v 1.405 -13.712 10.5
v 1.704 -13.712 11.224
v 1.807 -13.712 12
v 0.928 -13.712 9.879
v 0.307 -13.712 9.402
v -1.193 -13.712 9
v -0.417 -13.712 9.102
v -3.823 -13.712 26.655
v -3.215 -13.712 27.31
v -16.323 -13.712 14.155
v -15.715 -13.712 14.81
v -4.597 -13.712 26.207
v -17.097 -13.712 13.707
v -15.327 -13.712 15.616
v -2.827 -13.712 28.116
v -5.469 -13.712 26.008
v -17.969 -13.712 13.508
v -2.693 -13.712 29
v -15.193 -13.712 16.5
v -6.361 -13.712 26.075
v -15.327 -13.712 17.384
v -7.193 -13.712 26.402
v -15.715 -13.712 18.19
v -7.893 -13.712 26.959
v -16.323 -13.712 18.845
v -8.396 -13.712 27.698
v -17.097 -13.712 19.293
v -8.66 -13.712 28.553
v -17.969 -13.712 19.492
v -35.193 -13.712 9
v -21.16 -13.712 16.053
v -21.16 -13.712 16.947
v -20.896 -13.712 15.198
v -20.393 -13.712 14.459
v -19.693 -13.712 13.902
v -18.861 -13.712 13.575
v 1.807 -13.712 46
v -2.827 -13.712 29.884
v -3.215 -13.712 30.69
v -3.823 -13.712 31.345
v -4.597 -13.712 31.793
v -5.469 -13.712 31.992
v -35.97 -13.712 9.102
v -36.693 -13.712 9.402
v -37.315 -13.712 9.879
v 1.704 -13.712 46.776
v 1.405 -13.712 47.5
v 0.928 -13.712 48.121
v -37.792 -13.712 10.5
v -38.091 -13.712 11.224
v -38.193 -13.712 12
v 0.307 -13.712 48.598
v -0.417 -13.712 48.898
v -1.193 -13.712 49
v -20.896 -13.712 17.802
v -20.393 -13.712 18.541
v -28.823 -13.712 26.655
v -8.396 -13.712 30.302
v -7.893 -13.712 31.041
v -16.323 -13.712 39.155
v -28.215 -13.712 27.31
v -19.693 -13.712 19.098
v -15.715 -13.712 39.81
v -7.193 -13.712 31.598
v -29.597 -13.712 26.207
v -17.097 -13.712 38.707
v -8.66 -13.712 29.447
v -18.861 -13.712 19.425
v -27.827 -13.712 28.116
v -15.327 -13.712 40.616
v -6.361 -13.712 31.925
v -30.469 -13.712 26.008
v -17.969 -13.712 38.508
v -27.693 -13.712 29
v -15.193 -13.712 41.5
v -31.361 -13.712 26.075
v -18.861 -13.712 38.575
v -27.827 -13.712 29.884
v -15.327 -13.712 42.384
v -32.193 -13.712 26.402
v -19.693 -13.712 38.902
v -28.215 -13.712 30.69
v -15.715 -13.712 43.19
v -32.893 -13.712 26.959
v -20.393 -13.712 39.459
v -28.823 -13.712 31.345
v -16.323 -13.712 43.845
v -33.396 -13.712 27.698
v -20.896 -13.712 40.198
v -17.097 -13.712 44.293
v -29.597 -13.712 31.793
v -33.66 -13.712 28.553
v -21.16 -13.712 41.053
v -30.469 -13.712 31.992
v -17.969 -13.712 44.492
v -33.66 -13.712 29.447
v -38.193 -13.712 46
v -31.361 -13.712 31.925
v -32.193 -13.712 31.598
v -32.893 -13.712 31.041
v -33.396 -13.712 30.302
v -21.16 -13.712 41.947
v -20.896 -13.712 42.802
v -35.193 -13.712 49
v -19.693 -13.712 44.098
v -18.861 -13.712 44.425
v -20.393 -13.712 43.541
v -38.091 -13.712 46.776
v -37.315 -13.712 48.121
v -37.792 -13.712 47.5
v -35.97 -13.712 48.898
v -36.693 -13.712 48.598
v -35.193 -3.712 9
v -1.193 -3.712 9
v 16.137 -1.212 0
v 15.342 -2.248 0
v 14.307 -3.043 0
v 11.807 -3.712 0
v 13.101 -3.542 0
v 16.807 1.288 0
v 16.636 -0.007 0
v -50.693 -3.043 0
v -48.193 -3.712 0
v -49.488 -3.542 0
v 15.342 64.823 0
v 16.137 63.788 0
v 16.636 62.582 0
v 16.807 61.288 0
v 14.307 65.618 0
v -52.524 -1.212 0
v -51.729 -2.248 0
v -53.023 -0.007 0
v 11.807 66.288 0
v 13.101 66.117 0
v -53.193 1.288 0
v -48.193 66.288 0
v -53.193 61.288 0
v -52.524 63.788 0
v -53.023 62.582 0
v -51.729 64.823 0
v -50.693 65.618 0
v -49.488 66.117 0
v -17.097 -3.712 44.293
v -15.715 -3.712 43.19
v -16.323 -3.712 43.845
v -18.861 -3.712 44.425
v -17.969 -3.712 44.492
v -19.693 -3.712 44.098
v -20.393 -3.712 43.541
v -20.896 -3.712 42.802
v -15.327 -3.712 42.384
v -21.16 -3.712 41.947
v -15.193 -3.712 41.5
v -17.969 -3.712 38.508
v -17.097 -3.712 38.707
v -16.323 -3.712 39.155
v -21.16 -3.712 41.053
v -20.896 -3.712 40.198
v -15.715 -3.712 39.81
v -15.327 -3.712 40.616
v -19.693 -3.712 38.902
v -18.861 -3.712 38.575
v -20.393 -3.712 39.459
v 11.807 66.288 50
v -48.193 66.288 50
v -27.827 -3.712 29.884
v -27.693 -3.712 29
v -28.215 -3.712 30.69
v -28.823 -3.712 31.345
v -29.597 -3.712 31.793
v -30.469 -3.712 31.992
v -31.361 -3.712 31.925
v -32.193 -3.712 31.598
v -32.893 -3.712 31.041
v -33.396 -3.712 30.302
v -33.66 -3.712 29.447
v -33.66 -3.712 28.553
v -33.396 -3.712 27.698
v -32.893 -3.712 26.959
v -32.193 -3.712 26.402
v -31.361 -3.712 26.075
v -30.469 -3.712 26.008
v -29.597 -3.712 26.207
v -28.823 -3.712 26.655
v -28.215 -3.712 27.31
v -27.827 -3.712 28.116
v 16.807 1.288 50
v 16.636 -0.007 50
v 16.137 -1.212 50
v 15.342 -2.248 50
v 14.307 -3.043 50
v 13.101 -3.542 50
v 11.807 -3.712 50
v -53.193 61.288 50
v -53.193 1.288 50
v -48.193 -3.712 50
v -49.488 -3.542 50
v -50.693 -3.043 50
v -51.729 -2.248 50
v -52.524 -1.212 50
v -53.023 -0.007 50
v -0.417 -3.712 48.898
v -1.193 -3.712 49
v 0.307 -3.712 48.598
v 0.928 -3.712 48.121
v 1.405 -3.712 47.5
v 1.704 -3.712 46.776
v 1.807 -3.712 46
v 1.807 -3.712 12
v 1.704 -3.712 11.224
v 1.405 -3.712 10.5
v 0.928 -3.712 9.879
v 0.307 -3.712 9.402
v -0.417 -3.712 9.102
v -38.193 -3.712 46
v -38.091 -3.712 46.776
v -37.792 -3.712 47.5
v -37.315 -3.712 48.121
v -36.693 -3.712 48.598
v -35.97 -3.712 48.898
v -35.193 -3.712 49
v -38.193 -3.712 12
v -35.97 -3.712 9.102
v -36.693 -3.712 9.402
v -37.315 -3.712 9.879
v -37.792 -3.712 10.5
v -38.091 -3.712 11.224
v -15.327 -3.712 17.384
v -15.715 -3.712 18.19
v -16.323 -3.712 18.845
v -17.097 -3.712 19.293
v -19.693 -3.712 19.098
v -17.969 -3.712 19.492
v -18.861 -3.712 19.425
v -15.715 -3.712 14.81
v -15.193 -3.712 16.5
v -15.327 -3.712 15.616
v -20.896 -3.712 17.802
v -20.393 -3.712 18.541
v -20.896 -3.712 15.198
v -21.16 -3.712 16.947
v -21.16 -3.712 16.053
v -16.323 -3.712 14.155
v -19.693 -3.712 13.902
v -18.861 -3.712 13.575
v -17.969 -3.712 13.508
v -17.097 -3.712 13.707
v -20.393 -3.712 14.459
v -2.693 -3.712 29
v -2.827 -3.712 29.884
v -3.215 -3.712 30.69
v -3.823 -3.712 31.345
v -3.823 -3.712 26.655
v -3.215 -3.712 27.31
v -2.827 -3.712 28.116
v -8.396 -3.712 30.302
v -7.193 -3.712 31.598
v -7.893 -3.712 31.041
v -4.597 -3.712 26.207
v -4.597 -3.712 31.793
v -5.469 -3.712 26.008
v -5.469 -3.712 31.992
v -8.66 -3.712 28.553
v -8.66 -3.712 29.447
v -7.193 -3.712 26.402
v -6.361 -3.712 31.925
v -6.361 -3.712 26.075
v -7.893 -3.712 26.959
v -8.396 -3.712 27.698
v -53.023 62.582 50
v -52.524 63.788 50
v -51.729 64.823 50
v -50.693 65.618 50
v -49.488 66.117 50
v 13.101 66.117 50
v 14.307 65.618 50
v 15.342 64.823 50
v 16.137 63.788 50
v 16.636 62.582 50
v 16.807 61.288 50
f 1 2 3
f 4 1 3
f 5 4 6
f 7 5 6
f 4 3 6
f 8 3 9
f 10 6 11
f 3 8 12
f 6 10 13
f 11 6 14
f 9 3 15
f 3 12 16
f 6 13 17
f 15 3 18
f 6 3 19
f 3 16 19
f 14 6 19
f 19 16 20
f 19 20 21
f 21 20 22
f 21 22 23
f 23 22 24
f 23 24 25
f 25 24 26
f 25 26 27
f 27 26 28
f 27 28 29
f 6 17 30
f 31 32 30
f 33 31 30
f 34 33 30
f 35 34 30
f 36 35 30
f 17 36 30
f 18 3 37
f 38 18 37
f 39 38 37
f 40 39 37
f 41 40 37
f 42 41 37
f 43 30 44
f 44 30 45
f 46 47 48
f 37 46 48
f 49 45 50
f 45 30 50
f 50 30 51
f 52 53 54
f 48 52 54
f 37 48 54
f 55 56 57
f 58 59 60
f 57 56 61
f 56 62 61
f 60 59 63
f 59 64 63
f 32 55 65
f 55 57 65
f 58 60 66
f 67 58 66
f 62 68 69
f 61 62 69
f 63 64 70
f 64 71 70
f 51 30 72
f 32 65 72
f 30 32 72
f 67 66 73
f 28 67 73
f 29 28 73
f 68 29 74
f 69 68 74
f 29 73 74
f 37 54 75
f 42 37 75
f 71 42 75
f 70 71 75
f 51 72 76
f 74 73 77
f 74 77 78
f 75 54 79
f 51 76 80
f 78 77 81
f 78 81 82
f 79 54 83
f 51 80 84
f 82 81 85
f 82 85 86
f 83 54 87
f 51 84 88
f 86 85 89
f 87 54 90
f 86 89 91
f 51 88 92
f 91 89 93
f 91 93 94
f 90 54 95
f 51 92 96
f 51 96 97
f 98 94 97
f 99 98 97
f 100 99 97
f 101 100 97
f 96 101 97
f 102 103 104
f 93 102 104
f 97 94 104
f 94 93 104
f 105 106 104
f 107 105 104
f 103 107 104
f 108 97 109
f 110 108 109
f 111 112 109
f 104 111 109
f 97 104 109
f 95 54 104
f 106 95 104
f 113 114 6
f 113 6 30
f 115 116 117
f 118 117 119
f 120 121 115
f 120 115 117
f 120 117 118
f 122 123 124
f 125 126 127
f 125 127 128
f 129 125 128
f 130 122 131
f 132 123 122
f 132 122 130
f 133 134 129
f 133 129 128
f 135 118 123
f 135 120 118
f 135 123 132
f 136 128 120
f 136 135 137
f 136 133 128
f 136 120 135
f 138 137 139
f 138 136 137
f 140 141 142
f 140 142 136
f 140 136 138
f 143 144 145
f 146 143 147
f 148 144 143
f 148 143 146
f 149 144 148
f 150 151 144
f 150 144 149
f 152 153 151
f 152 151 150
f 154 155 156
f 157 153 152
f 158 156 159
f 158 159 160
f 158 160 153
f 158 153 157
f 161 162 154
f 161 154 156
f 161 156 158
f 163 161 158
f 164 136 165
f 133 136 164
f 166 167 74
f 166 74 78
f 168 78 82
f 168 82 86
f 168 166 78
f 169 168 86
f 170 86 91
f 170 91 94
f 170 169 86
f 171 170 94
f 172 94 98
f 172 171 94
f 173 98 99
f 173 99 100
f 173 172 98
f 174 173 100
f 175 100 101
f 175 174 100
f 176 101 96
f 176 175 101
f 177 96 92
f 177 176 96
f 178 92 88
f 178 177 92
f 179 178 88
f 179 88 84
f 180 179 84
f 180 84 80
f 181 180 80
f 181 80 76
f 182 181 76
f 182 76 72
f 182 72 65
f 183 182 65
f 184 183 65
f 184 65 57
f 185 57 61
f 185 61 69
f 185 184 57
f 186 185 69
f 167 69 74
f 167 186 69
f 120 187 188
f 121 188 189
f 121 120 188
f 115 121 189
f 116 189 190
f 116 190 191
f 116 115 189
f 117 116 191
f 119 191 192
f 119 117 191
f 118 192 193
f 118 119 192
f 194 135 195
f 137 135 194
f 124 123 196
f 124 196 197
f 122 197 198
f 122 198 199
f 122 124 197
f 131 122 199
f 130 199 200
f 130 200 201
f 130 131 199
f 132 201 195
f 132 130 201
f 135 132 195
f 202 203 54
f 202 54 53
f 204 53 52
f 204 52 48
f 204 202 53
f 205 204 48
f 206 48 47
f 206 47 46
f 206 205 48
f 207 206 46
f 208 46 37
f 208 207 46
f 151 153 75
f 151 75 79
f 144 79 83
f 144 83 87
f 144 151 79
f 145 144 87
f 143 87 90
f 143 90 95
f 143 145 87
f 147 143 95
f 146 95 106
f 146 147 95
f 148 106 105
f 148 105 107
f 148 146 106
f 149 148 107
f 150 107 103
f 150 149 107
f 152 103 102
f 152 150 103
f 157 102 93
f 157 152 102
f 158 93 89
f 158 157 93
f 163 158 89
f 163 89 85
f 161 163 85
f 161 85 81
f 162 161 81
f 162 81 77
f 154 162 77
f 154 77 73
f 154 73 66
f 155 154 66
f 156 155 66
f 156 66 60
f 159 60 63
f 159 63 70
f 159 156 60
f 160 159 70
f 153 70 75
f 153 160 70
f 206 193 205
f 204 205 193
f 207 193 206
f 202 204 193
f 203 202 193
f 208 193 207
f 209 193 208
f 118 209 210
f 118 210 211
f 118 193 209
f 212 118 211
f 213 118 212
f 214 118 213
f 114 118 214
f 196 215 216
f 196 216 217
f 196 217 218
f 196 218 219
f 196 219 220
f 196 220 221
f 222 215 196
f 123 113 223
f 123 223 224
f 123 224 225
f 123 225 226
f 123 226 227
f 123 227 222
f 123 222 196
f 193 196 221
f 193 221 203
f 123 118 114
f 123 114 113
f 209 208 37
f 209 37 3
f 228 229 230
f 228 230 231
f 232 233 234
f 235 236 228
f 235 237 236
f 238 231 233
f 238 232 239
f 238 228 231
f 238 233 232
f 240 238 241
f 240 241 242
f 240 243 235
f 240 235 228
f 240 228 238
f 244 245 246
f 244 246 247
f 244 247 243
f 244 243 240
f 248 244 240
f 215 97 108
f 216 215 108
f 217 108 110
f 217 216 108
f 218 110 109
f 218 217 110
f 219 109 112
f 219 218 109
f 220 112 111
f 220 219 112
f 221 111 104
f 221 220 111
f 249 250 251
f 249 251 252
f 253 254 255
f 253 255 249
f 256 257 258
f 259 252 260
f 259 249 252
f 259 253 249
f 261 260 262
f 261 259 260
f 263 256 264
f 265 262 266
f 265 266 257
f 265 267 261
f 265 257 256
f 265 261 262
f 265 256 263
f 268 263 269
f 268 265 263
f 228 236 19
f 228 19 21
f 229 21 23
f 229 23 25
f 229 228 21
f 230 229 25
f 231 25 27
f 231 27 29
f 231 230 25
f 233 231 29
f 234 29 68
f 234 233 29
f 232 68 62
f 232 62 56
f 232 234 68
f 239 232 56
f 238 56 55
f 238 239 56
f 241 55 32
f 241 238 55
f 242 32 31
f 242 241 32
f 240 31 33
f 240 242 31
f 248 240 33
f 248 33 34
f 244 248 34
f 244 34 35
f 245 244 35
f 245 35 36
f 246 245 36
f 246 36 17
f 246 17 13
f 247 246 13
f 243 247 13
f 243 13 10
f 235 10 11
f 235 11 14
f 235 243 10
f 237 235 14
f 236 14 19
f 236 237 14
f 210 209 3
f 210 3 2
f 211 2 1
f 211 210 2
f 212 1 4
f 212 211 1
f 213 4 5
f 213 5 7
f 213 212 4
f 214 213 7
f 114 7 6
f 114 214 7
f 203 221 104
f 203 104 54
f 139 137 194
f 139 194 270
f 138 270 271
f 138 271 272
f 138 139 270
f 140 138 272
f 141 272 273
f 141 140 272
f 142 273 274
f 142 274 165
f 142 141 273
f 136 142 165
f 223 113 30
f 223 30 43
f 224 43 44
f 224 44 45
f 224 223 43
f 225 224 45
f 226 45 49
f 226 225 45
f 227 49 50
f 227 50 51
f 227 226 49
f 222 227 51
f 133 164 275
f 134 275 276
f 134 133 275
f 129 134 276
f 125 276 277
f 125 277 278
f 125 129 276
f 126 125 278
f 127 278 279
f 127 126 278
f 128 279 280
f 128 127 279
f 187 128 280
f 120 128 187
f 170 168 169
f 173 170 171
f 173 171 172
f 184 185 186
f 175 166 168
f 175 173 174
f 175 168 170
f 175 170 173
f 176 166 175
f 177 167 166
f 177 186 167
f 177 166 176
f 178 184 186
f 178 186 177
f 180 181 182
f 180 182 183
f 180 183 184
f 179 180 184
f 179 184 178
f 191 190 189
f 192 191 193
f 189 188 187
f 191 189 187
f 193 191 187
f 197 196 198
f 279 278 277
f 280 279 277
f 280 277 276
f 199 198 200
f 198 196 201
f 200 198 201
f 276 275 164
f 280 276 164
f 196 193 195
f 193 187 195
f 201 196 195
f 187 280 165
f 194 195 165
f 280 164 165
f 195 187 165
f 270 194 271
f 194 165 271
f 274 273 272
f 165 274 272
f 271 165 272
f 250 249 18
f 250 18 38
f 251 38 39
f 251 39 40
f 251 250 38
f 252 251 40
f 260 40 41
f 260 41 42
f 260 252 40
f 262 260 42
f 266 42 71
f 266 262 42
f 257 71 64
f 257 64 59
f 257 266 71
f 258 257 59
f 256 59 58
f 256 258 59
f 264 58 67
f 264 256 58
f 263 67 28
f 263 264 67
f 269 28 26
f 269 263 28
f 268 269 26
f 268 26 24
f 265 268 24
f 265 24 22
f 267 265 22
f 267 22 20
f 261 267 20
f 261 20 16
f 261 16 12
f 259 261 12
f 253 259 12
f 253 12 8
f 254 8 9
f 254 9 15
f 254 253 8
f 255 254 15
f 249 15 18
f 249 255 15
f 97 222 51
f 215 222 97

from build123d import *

# Parameters (mm, degrees)
EXTRUDE_1_DEPTH = 50
SKETCH_2_R      = 3
EXTRUDE_2_DEPTH = 10


with BuildPart() as part:
    # 草图1 → 凸台-拉伸1 (new body)
    with BuildSketch(Plane.XY):
        with BuildLine():
            Line((-48.193457488, 66.287565891), (11.806542512, 66.287565891))
            ThreePointArc((11.806542512, 66.287565891), (15.342076418, 64.823099797), (16.806542512, 61.287565891))
            Line((16.806542512, 61.287565891), (16.806542512, 1.287565891))
            ThreePointArc((16.806542512, 1.287565891), (15.342076418, -2.247968015), (11.806542512, -3.712434109))
            Line((11.806542512, -3.712434109), (-48.193457488, -3.712434109))
            ThreePointArc((-48.193457488, -3.712434109), (-51.728991394, -2.247968015), (-53.193457488, 1.287565891))
            Line((-53.193457488, 1.287565891), (-53.193457488, 61.287565891))
            ThreePointArc((-53.193457488, 61.287565891), (-51.728991394, 64.823099797), (-48.193457488, 66.287565891))
        make_face()
    extrude(amount=EXTRUDE_1_DEPTH)

    # 草图2 → 凸台-拉伸2 (add)
    with BuildSketch(Plane.XZ.offset(3.712434109)):
        with BuildLine():
            Line((-18.193457488, 9), (-35.193457488, 9))
            ThreePointArc((-35.193457488, 9), (-37.314777832, 9.878679656), (-38.193457488, 12))
            Line((-38.193457488, 12), (-38.193457488, 46))
            ThreePointArc((-38.193457488, 46), (-37.314777832, 48.121320344), (-35.193457488, 49))
            Line((-35.193457488, 49), (-1.193457488, 49))
            ThreePointArc((-1.193457488, 49), (0.927862855, 48.121320344), (1.806542512, 46))
            Line((1.806542512, 46), (1.806542512, 12))
            ThreePointArc((1.806542512, 12), (0.927862855, 9.878679656), (-1.193457488, 9))
            Line((-1.193457488, 9), (-18.193457488, 9))
        make_face()
        with Locations((-18.193457488, 41.5)):
            Circle(SKETCH_2_R, mode=Mode.SUBTRACT)
        with Locations((-30.693457488, 29)):
            Circle(SKETCH_2_R, mode=Mode.SUBTRACT)
        with Locations((-18.193457488, 16.5)):
            Circle(SKETCH_2_R, mode=Mode.SUBTRACT)
        with Locations((-5.693457488, 29)):
            Circle(SKETCH_2_R, mode=Mode.SUBTRACT)
    extrude(amount=EXTRUDE_2_DEPTH)


solid = part.part
